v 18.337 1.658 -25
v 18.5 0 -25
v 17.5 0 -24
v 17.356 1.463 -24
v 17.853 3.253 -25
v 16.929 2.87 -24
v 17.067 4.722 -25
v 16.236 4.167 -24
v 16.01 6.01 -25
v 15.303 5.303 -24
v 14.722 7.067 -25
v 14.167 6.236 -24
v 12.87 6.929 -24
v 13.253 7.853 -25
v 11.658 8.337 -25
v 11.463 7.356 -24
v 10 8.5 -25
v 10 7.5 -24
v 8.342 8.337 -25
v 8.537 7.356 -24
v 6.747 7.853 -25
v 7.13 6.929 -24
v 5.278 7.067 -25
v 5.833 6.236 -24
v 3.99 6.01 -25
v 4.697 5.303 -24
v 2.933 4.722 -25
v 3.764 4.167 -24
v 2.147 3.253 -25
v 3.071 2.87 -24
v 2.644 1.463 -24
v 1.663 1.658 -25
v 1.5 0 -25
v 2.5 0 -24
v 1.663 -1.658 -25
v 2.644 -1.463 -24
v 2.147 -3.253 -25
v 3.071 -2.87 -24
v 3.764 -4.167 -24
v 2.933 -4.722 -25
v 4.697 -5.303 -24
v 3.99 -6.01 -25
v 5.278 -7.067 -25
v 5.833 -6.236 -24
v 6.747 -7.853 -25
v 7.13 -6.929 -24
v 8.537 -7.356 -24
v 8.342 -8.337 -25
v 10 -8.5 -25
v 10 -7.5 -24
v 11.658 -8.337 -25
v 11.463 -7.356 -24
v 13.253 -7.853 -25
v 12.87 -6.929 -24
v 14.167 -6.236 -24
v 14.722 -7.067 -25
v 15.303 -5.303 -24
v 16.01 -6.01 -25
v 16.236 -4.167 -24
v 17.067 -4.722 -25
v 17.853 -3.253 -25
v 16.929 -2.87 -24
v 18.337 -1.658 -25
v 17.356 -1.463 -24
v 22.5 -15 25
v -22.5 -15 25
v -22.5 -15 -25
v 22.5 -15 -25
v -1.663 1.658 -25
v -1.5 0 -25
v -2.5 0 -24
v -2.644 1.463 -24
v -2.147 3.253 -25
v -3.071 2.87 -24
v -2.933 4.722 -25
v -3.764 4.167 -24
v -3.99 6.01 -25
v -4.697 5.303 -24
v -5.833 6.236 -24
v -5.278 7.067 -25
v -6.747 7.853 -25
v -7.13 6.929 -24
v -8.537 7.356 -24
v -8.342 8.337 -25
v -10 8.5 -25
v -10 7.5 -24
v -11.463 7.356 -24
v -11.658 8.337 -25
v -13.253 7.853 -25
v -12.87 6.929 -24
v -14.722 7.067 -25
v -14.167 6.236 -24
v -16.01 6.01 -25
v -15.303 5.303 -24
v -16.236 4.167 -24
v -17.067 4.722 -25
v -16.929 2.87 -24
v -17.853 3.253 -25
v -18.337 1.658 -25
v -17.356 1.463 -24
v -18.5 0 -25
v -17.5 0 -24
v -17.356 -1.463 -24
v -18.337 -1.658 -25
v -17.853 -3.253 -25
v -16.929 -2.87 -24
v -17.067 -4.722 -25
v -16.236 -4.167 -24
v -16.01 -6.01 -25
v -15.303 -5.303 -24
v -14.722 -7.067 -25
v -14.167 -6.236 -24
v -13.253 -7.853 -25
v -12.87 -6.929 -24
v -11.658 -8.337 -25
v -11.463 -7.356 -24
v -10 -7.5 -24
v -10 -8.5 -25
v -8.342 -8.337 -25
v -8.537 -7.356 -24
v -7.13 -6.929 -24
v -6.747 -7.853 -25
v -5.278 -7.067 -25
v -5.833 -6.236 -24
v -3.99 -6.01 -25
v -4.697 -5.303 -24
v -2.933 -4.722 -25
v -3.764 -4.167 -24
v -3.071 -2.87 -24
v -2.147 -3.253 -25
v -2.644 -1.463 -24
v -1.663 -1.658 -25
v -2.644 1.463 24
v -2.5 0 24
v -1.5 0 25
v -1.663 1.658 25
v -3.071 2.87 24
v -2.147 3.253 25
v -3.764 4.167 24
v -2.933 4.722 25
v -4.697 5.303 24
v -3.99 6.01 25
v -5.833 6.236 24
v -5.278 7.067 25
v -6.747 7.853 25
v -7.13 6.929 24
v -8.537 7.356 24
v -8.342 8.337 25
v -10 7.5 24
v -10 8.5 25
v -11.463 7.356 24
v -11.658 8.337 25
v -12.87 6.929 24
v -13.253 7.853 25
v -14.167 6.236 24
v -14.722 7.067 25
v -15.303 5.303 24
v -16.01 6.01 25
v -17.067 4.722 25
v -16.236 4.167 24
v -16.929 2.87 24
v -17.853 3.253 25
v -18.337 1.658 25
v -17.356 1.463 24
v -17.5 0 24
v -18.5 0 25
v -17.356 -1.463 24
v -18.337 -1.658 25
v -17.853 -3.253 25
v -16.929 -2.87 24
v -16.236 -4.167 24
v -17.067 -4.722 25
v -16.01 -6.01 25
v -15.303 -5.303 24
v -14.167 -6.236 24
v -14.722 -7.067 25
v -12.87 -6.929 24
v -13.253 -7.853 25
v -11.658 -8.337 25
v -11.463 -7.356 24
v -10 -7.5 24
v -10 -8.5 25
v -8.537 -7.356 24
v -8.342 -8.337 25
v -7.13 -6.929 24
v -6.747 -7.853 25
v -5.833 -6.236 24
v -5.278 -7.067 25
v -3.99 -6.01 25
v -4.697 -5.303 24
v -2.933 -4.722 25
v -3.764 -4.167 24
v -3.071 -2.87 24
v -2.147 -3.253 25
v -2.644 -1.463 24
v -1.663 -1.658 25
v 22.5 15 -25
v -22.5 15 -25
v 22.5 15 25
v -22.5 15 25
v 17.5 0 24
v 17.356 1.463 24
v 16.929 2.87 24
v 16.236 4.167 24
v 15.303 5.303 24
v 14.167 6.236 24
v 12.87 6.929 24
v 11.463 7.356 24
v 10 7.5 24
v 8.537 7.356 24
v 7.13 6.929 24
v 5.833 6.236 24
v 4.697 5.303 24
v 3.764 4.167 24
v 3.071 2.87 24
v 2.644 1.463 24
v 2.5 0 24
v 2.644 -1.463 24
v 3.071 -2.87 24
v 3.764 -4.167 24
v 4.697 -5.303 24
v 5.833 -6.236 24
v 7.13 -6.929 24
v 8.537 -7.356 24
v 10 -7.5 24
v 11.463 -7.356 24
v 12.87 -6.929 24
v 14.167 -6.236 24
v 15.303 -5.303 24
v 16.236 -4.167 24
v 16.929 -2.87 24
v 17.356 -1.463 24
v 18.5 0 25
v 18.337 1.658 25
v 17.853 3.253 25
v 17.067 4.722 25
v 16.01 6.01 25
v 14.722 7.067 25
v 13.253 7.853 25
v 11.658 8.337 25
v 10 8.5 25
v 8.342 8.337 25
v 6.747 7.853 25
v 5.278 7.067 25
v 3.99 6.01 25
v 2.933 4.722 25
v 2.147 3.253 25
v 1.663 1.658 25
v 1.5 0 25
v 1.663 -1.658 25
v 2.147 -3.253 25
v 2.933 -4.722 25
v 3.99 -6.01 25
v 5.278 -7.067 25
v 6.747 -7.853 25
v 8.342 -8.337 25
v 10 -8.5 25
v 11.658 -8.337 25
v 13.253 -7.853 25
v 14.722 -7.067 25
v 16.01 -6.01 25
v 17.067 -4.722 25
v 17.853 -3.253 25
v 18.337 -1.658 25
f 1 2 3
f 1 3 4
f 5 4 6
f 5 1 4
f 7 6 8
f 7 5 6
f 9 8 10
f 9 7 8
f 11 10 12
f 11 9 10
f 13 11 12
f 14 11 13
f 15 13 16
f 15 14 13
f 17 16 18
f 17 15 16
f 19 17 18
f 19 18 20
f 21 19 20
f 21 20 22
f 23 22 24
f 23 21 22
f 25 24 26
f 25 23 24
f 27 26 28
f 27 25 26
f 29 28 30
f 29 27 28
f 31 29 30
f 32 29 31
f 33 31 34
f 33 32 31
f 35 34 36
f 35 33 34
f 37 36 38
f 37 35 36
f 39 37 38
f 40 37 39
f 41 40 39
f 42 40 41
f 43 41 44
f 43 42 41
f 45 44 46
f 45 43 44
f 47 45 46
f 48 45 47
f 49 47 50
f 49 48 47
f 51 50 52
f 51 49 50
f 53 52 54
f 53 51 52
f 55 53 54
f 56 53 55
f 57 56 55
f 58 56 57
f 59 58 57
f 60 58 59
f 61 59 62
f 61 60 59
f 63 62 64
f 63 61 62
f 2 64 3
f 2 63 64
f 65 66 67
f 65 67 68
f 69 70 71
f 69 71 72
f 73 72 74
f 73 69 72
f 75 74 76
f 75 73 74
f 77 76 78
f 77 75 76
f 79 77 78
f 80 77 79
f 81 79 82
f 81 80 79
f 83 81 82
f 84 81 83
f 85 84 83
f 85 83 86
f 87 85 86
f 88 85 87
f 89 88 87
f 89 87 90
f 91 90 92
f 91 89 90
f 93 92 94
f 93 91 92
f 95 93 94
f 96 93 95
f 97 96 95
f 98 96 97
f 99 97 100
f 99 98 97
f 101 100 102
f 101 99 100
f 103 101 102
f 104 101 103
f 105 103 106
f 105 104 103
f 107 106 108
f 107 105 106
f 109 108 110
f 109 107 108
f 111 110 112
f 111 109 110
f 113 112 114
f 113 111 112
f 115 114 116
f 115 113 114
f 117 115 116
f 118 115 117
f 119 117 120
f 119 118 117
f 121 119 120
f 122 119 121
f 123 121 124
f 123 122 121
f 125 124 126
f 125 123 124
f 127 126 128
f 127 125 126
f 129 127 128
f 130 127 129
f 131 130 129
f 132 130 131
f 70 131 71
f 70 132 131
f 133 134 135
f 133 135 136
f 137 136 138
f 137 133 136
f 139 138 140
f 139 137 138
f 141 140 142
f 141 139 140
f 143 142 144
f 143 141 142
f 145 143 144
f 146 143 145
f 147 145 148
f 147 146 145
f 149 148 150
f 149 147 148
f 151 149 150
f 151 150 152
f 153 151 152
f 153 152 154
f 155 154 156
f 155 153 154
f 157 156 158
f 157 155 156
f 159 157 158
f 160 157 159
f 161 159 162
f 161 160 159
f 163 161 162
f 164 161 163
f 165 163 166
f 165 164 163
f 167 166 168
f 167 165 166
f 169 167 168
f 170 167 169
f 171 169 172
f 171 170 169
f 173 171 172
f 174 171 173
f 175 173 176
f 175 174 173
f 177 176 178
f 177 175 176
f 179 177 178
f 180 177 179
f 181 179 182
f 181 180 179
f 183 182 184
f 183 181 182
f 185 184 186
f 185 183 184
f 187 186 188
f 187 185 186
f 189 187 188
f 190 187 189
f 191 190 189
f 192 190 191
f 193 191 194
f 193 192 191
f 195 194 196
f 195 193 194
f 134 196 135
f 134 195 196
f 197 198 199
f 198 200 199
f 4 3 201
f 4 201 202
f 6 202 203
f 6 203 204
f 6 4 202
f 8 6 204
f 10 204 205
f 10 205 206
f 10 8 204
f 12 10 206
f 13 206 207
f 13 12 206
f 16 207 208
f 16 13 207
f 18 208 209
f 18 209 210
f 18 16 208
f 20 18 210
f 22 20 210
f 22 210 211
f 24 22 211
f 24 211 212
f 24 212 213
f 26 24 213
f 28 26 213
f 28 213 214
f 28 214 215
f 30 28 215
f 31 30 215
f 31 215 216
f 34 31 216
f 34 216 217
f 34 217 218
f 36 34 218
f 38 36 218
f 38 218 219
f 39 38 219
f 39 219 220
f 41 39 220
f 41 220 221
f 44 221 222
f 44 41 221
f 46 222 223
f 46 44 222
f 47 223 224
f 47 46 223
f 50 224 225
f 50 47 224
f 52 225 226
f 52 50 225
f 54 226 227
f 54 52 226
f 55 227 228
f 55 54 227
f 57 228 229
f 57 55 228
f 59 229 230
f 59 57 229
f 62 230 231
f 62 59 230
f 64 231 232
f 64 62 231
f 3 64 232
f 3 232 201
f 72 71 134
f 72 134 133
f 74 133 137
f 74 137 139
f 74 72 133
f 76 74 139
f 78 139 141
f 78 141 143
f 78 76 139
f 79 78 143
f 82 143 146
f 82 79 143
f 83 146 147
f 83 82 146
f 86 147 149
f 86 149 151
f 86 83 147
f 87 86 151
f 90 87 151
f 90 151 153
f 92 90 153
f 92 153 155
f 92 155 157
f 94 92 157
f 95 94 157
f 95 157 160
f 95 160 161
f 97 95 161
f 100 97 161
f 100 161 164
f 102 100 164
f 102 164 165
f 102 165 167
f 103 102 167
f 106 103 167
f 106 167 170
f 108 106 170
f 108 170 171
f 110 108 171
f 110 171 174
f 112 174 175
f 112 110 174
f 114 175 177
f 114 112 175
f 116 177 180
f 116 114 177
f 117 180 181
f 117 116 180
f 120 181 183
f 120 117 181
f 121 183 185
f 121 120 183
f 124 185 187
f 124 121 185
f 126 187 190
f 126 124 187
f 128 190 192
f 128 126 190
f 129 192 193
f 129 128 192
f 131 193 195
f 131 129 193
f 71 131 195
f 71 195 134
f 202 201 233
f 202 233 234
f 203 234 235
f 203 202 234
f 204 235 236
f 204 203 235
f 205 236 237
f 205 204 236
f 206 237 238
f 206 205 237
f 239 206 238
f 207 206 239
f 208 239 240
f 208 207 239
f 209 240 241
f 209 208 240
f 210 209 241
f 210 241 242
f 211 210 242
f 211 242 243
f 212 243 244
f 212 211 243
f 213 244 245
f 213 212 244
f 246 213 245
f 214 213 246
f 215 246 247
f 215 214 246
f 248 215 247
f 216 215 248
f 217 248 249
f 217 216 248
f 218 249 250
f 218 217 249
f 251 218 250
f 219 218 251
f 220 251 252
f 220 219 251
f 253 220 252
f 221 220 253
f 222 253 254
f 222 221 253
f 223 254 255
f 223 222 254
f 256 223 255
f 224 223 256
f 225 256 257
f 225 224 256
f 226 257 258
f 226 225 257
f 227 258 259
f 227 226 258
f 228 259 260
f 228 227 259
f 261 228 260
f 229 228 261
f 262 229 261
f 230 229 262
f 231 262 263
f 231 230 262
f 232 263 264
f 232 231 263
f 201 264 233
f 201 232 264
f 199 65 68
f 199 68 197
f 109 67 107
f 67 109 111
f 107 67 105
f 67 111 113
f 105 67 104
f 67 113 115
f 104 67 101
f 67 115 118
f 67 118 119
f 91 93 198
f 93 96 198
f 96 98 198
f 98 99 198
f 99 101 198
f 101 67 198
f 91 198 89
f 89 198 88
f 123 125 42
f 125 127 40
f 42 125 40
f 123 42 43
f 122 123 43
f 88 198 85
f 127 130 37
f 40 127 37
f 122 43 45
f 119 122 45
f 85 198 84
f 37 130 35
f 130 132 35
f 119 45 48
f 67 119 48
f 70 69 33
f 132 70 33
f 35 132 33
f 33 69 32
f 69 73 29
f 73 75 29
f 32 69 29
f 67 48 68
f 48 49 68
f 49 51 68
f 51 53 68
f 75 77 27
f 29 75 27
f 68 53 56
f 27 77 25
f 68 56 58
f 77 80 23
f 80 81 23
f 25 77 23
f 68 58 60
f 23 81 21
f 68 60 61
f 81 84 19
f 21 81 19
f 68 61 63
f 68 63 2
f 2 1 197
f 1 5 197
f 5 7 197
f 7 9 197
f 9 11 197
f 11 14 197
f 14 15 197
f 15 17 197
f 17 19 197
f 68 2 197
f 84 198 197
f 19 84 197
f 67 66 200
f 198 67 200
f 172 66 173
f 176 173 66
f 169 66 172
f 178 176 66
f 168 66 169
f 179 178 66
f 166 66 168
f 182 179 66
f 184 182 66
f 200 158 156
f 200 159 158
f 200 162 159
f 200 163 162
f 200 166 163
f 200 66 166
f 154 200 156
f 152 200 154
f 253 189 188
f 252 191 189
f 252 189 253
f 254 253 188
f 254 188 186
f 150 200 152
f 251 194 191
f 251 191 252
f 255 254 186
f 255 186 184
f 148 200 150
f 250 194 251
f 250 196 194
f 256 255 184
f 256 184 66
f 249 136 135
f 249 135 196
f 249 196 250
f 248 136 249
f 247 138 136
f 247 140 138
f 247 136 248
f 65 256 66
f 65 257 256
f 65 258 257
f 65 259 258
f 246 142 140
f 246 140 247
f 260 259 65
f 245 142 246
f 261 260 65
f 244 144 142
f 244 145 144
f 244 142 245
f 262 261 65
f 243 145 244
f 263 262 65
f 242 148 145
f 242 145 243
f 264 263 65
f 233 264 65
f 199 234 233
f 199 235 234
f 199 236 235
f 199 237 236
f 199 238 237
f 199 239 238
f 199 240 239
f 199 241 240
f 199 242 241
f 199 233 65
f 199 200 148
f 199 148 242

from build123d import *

# Parameters (mm, degrees)
SKETCH1_W           = 45
SKETCH1_H           = 30
SKETCH1_R           = 7.5
BOSS_EXTRUDE1_DEPTH = 25
CHAMFER1_SIZE       = 1


with BuildPart() as part:
    # Sketch1 → Boss-Extrude1 (new body, symmetric)
    with BuildSketch(Plane.XY):
        Rectangle(SKETCH1_W, SKETCH1_H)
        with Locations((-10, 0)):
            Circle(SKETCH1_R, mode=Mode.SUBTRACT)
        with Locations((10, 0)):
            Circle(SKETCH1_R, mode=Mode.SUBTRACT)
    extrude(amount=BOSS_EXTRUDE1_DEPTH, both=True)

    # Chamfer1
    chamfer1_edges = [part.edges().sort_by_distance(p)[0] for p in [
        (-17.5, 0, -25),
        (-17.5, 0, 25),
        (2.5, 0, -25),
        (2.5, 0, 25),
    ]]
    chamfer(chamfer1_edges, length=CHAMFER1_SIZE)


solid = part.part
